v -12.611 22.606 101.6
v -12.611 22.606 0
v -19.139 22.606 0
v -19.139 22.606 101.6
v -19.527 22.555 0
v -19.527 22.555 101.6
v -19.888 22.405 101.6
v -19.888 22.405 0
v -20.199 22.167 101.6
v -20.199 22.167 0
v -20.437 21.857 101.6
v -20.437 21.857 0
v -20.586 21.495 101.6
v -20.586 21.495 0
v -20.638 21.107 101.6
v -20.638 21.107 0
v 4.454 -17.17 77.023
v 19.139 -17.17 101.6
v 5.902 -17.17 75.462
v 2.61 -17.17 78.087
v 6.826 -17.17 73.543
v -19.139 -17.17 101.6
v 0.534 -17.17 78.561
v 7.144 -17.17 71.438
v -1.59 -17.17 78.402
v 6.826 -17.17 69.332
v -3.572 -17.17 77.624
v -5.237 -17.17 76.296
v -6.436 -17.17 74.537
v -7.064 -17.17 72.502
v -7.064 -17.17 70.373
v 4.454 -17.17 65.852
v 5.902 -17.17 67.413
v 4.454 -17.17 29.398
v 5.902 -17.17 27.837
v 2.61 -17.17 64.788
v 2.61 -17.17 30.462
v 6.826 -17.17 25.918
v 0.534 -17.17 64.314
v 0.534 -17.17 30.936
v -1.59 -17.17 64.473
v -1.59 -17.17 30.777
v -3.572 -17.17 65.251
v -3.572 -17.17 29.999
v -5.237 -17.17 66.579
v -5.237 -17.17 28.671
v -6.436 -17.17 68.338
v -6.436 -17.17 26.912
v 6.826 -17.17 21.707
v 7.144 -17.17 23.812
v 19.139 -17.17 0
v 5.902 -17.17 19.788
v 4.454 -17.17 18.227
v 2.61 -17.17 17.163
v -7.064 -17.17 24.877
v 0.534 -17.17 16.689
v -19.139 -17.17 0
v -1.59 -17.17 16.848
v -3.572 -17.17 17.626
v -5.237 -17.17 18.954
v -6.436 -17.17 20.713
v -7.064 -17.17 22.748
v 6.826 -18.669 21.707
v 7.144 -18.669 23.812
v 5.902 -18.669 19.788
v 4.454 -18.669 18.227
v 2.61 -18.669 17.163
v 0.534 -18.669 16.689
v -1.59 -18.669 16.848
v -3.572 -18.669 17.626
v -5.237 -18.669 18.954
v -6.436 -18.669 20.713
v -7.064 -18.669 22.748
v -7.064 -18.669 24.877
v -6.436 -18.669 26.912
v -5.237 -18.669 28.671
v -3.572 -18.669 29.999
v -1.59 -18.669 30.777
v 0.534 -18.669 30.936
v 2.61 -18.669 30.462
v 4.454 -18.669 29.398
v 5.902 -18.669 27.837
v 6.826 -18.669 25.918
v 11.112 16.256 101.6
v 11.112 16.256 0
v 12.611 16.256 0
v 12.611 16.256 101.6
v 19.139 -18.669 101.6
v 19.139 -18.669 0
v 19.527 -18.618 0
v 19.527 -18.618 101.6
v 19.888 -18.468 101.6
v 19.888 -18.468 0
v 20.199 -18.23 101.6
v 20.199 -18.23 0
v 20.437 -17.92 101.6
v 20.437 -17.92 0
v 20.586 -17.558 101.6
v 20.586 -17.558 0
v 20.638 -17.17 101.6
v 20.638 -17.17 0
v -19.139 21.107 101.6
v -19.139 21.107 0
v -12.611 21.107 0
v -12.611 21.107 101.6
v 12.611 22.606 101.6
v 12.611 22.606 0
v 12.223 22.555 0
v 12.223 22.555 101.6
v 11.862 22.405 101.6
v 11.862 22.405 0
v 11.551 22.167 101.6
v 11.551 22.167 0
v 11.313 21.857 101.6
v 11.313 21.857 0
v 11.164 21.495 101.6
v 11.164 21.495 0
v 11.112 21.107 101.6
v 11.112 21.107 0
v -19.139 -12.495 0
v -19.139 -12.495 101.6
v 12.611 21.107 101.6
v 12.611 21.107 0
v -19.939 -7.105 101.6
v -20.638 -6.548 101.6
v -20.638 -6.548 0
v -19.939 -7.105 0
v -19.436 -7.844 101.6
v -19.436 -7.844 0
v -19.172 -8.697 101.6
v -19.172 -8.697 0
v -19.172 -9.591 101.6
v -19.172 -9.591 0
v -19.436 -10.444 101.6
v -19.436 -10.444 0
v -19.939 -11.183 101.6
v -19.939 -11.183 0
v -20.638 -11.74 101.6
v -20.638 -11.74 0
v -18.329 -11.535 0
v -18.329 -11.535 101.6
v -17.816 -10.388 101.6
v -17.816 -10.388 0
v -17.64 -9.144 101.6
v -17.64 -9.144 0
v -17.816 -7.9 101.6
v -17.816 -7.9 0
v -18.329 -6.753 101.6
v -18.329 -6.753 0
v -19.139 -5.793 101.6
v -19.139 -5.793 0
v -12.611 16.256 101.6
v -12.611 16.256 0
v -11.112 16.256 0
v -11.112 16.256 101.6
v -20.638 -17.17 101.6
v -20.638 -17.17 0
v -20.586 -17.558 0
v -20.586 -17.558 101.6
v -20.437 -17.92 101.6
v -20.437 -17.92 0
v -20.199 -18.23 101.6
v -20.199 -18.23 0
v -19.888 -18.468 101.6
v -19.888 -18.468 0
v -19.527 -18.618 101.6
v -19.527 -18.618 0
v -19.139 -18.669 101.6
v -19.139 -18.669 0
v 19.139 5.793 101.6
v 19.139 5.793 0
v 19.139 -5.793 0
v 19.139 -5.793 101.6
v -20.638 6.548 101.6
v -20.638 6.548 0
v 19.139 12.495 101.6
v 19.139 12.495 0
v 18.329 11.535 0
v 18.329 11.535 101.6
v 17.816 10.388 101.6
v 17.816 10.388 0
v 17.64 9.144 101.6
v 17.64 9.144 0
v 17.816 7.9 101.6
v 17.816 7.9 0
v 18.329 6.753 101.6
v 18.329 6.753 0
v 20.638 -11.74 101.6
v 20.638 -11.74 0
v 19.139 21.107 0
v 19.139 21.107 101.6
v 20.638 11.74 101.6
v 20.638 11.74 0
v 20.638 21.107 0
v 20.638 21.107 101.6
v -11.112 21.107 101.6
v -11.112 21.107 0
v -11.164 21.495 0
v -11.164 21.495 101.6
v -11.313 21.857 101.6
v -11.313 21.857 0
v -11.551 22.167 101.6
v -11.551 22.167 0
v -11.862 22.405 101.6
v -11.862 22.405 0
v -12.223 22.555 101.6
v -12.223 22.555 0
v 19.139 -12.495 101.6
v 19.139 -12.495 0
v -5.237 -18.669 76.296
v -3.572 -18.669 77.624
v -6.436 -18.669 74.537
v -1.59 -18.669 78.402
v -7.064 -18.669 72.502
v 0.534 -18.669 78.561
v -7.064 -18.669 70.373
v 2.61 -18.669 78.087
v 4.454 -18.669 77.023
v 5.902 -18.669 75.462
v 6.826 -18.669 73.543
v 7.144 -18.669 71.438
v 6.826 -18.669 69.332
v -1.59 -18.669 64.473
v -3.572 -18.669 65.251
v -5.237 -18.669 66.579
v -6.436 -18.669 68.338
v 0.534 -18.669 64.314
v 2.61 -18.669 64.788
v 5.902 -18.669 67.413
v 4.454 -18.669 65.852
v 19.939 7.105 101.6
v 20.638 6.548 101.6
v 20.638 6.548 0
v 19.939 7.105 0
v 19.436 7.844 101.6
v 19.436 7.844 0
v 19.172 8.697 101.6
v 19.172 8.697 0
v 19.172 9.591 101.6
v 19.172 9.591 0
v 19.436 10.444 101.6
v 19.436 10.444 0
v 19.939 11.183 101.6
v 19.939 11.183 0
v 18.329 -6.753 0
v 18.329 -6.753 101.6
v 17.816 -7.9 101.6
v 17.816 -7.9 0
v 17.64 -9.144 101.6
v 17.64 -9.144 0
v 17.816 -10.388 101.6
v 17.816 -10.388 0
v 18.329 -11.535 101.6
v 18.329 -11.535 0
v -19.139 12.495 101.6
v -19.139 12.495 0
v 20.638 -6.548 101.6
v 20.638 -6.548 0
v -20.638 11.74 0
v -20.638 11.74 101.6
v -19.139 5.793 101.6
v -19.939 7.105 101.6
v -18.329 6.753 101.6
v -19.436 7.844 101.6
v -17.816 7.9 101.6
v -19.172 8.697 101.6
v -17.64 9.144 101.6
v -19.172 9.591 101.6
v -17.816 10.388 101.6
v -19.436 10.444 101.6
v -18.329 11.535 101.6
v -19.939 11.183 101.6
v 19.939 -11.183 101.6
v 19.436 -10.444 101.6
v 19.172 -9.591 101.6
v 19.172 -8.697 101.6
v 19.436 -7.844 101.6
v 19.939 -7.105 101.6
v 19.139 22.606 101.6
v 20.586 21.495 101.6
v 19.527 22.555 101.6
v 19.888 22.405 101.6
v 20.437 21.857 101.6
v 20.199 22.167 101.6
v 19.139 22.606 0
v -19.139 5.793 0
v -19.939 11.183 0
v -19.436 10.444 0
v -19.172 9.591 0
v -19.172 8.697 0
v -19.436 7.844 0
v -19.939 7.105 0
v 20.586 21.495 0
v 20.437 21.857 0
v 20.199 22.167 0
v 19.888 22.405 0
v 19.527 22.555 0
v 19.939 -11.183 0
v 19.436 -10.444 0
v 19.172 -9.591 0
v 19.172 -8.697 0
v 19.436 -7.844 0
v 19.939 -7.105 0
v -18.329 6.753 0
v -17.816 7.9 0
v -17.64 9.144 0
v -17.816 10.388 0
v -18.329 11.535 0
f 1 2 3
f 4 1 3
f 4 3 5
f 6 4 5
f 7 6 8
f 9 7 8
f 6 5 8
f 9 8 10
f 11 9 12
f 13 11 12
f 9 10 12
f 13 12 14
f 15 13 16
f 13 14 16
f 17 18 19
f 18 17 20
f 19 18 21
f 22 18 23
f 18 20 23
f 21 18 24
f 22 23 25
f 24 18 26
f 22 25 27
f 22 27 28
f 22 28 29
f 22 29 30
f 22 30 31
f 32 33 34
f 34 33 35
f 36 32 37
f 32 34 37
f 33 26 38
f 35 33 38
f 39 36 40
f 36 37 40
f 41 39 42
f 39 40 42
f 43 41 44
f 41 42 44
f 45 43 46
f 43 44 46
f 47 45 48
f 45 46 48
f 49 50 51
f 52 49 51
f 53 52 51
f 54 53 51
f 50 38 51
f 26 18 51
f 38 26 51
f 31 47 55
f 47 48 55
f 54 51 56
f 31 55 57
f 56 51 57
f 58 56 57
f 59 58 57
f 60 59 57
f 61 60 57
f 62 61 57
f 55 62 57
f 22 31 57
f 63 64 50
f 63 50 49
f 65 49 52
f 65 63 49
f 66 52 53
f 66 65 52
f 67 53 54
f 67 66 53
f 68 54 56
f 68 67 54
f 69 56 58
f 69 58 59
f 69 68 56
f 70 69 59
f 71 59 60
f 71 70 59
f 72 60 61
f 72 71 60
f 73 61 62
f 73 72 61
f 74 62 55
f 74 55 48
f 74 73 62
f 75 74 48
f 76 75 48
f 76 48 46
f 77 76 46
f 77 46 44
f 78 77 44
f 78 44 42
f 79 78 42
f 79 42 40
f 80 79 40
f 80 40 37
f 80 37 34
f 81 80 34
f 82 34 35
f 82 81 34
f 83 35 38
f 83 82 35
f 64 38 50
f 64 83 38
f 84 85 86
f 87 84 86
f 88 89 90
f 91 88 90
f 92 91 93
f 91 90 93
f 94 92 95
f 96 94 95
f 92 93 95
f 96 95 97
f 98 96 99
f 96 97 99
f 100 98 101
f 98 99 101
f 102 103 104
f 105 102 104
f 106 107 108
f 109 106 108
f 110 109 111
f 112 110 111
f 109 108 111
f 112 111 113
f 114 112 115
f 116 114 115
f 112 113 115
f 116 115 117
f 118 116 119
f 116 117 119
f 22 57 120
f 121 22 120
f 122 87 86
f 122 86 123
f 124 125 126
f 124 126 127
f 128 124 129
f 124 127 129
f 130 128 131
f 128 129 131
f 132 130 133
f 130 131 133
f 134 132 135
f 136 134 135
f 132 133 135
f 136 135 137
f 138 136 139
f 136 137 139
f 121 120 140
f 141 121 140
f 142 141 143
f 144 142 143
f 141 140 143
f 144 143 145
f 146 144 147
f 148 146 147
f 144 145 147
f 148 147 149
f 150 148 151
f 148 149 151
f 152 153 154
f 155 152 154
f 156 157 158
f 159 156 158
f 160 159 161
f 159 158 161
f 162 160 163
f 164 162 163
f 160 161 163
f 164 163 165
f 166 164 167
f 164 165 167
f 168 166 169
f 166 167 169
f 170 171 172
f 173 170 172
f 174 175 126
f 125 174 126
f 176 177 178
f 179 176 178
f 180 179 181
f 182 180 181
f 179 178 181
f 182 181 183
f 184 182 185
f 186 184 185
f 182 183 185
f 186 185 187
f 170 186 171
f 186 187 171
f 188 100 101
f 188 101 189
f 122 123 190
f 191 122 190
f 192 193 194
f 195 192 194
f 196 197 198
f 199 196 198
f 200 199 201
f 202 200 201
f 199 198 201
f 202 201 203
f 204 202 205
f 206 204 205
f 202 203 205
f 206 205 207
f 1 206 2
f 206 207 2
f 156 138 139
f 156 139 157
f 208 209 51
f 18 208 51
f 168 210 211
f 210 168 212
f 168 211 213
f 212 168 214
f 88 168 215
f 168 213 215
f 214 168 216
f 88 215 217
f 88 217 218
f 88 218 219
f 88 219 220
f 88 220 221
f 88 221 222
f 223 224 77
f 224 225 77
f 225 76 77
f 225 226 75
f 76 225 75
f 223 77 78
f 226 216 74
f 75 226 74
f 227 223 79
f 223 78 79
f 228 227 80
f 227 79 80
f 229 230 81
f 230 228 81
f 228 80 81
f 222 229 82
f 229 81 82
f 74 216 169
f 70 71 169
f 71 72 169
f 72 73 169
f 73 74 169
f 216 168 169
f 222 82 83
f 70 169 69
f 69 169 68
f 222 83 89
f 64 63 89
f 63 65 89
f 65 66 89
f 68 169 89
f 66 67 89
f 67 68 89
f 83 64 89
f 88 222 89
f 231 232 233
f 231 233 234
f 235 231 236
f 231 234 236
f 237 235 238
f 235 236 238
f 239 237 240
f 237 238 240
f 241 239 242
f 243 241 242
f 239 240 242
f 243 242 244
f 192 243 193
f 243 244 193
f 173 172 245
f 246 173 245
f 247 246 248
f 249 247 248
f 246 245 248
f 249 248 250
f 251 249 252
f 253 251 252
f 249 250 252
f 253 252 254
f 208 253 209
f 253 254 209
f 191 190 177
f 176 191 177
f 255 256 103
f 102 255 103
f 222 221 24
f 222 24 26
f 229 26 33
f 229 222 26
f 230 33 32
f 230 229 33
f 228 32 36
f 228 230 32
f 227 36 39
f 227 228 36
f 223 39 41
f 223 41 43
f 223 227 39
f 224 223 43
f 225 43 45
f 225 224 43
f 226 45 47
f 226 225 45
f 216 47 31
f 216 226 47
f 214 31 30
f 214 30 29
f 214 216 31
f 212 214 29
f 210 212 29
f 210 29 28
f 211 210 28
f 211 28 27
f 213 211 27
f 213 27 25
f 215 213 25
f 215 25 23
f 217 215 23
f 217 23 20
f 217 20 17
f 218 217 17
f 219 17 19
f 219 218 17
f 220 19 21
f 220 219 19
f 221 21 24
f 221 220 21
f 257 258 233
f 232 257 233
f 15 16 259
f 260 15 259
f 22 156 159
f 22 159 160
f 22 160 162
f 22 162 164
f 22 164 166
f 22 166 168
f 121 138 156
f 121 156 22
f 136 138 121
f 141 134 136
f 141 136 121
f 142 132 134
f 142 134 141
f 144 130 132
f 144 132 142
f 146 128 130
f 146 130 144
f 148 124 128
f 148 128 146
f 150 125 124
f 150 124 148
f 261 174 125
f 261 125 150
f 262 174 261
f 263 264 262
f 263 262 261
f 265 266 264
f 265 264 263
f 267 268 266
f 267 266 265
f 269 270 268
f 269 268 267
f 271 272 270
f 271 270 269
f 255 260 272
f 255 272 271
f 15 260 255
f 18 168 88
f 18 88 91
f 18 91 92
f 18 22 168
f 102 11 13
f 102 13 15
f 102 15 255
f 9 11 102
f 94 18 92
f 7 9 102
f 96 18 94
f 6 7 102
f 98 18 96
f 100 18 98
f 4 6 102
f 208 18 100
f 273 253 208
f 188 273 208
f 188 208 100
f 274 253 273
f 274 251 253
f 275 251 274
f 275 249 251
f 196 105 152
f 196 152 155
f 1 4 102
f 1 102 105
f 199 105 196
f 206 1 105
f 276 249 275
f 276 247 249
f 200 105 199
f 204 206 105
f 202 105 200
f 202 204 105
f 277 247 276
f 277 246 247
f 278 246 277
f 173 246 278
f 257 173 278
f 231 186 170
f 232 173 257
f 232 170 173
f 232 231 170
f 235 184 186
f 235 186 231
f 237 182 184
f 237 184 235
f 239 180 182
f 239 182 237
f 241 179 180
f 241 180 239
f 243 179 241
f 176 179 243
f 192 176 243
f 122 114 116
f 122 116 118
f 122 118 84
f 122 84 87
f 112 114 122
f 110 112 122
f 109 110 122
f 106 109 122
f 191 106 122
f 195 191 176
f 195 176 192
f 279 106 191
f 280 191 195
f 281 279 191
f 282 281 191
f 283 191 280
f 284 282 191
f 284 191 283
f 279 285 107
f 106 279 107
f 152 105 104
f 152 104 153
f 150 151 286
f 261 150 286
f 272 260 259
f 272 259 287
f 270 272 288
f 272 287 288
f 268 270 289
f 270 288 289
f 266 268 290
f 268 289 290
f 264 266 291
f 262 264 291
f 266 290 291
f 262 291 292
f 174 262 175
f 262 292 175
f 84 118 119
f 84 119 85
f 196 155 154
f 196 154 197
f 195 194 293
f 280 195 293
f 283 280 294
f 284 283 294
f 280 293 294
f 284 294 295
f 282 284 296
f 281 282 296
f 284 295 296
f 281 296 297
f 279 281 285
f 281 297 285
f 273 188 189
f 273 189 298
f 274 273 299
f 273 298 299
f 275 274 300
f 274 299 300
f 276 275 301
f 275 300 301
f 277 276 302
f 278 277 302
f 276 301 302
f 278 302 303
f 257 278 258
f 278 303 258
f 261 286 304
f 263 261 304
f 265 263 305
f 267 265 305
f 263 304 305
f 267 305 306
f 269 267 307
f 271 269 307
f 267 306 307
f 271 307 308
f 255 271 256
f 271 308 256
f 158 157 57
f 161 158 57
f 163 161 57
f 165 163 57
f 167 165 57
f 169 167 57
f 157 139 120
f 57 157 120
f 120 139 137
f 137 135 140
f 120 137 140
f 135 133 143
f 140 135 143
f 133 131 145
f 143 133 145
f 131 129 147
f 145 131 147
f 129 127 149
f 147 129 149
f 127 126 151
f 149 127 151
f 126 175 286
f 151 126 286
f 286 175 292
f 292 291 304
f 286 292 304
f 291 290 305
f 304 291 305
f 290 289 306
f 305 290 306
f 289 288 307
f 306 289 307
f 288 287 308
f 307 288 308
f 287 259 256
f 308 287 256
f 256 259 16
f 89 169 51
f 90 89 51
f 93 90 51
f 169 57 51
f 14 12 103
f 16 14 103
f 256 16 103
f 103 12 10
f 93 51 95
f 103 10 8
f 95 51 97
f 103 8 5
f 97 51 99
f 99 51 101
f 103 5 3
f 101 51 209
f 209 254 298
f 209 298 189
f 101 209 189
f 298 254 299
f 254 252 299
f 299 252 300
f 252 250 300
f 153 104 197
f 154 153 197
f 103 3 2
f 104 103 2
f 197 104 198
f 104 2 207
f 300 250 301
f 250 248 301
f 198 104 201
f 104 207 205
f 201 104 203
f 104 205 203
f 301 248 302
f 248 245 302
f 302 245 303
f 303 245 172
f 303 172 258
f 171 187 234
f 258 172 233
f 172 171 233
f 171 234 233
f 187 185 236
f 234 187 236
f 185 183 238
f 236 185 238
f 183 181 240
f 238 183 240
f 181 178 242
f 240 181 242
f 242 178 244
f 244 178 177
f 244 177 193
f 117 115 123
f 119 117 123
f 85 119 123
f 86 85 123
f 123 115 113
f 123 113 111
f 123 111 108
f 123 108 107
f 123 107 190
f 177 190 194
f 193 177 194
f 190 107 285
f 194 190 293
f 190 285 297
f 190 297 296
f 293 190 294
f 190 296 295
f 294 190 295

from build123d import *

# Parameters (mm, degrees)
BASE_EXTRUDE_DEPTH = 101.6
HOLE1_START        = -18.669
HOLE1_OUTLINE_R    = 7.14375
HOLE1_DEPTH        = 1.4986
LPATTERN2_COUNT    = 2
LPATTERN2_PITCH    = 47.625


# Read off the part's stored shape, not the designer's step: Hole1
with BuildPart() as part:
    # Sketch1 → Base-Extrude (new body)
    with BuildSketch(Plane.XY):
        with BuildLine():
            Line((-20.6375, 21.1074), (-20.6375, 11.73965134))
            ThreePointArc((-20.6375, 11.73965134), (-19.1389, 9.144), (-20.6375, 6.54834866))
            Line((-20.6375, 6.54834866), (-20.6375, -6.54834866))
            ThreePointArc((-20.6375, -6.54834866), (-19.1389, -9.144), (-20.6375, -11.73965134))
            Line((-20.6375, -11.73965134), (-20.6375, -17.1704))
            ThreePointArc((-20.6375, -17.1704), (-20.198570222, -18.230070222), (-19.1389, -18.669))
            Line((-19.1389, -18.669), (19.1389, -18.669))
            ThreePointArc((19.1389, -18.669), (20.198570222, -18.230070222), (20.6375, -17.1704))
            Line((20.6375, -17.1704), (20.6375, -11.73965134))
            ThreePointArc((20.6375, -11.73965134), (19.1389, -9.144), (20.6375, -6.54834866))
            Line((20.6375, -6.54834866), (20.6375, 6.54834866))
            ThreePointArc((20.6375, 6.54834866), (19.1389, 9.144), (20.6375, 11.73965134))
            Line((20.6375, 11.73965134), (20.6375, 21.1074))
            ThreePointArc((20.6375, 21.1074), (20.198570222, 22.167070222), (19.1389, 22.606))
            Line((19.1389, 22.606), (12.6111, 22.606))
            ThreePointArc((12.6111, 22.606), (11.551429778, 22.167070222), (11.1125, 21.1074))
            Line((11.1125, 21.1074), (11.1125, 16.256))
            Line((11.1125, 16.256), (12.6111, 16.256))
            Line((12.6111, 16.256), (12.6111, 21.1074))
            Line((12.6111, 21.1074), (19.1389, 21.1074))
            Line((19.1389, 21.1074), (19.1389, 12.494971471))
            ThreePointArc((19.1389, 12.494971471), (17.6403, 9.144), (19.1389, 5.793028529))
            Line((19.1389, 5.793028529), (19.1389, -5.793028529))
            ThreePointArc((19.1389, -5.793028529), (17.6403, -9.144), (19.1389, -12.494971471))
            Line((19.1389, -12.494971471), (19.1389, -17.1704))
            Line((19.1389, -17.1704), (-19.1389, -17.1704))
            Line((-19.1389, -17.1704), (-19.1389, -12.494971471))
            ThreePointArc((-19.1389, -12.494971471), (-17.6403, -9.144), (-19.1389, -5.793028529))
            Line((-19.1389, -5.793028529), (-19.1389, 5.793028529))
            ThreePointArc((-19.1389, 5.793028529), (-17.6403, 9.144), (-19.1389, 12.494971471))
            Line((-19.1389, 12.494971471), (-19.1389, 21.1074))
            Line((-19.1389, 21.1074), (-12.6111, 21.1074))
            Line((-12.6111, 21.1074), (-12.6111, 16.256))
            Line((-12.6111, 16.256), (-11.1125, 16.256))
            Line((-11.1125, 16.256), (-11.1125, 21.1074))
            ThreePointArc((-11.1125, 21.1074), (-11.551429778, 22.167070222), (-12.6111, 22.606))
            Line((-12.6111, 22.606), (-19.1389, 22.606))
            ThreePointArc((-19.1389, 22.606), (-20.198570222, 22.167070222), (-20.6375, 21.1074))
        make_face()
    extrude(amount=BASE_EXTRUDE_DEPTH)

    # Hole1 outline → Hole1 (cut)
    with BuildSketch(Plane(origin=(0, 0, 0), x_dir=(1, 0, 0), z_dir=(0, 1, 0)).offset(HOLE1_START)):
        with Locations((0, -23.8125)):
            Circle(HOLE1_OUTLINE_R)
    hole1 = extrude(amount=HOLE1_DEPTH, mode=Mode.SUBTRACT)

    # LPattern2: Hole1 ×2
    with Locations(*[(0, 0, i * LPATTERN2_PITCH) for i in range(1, LPATTERN2_COUNT)]):
        add(hole1, mode=Mode.SUBTRACT)


solid = part.part
